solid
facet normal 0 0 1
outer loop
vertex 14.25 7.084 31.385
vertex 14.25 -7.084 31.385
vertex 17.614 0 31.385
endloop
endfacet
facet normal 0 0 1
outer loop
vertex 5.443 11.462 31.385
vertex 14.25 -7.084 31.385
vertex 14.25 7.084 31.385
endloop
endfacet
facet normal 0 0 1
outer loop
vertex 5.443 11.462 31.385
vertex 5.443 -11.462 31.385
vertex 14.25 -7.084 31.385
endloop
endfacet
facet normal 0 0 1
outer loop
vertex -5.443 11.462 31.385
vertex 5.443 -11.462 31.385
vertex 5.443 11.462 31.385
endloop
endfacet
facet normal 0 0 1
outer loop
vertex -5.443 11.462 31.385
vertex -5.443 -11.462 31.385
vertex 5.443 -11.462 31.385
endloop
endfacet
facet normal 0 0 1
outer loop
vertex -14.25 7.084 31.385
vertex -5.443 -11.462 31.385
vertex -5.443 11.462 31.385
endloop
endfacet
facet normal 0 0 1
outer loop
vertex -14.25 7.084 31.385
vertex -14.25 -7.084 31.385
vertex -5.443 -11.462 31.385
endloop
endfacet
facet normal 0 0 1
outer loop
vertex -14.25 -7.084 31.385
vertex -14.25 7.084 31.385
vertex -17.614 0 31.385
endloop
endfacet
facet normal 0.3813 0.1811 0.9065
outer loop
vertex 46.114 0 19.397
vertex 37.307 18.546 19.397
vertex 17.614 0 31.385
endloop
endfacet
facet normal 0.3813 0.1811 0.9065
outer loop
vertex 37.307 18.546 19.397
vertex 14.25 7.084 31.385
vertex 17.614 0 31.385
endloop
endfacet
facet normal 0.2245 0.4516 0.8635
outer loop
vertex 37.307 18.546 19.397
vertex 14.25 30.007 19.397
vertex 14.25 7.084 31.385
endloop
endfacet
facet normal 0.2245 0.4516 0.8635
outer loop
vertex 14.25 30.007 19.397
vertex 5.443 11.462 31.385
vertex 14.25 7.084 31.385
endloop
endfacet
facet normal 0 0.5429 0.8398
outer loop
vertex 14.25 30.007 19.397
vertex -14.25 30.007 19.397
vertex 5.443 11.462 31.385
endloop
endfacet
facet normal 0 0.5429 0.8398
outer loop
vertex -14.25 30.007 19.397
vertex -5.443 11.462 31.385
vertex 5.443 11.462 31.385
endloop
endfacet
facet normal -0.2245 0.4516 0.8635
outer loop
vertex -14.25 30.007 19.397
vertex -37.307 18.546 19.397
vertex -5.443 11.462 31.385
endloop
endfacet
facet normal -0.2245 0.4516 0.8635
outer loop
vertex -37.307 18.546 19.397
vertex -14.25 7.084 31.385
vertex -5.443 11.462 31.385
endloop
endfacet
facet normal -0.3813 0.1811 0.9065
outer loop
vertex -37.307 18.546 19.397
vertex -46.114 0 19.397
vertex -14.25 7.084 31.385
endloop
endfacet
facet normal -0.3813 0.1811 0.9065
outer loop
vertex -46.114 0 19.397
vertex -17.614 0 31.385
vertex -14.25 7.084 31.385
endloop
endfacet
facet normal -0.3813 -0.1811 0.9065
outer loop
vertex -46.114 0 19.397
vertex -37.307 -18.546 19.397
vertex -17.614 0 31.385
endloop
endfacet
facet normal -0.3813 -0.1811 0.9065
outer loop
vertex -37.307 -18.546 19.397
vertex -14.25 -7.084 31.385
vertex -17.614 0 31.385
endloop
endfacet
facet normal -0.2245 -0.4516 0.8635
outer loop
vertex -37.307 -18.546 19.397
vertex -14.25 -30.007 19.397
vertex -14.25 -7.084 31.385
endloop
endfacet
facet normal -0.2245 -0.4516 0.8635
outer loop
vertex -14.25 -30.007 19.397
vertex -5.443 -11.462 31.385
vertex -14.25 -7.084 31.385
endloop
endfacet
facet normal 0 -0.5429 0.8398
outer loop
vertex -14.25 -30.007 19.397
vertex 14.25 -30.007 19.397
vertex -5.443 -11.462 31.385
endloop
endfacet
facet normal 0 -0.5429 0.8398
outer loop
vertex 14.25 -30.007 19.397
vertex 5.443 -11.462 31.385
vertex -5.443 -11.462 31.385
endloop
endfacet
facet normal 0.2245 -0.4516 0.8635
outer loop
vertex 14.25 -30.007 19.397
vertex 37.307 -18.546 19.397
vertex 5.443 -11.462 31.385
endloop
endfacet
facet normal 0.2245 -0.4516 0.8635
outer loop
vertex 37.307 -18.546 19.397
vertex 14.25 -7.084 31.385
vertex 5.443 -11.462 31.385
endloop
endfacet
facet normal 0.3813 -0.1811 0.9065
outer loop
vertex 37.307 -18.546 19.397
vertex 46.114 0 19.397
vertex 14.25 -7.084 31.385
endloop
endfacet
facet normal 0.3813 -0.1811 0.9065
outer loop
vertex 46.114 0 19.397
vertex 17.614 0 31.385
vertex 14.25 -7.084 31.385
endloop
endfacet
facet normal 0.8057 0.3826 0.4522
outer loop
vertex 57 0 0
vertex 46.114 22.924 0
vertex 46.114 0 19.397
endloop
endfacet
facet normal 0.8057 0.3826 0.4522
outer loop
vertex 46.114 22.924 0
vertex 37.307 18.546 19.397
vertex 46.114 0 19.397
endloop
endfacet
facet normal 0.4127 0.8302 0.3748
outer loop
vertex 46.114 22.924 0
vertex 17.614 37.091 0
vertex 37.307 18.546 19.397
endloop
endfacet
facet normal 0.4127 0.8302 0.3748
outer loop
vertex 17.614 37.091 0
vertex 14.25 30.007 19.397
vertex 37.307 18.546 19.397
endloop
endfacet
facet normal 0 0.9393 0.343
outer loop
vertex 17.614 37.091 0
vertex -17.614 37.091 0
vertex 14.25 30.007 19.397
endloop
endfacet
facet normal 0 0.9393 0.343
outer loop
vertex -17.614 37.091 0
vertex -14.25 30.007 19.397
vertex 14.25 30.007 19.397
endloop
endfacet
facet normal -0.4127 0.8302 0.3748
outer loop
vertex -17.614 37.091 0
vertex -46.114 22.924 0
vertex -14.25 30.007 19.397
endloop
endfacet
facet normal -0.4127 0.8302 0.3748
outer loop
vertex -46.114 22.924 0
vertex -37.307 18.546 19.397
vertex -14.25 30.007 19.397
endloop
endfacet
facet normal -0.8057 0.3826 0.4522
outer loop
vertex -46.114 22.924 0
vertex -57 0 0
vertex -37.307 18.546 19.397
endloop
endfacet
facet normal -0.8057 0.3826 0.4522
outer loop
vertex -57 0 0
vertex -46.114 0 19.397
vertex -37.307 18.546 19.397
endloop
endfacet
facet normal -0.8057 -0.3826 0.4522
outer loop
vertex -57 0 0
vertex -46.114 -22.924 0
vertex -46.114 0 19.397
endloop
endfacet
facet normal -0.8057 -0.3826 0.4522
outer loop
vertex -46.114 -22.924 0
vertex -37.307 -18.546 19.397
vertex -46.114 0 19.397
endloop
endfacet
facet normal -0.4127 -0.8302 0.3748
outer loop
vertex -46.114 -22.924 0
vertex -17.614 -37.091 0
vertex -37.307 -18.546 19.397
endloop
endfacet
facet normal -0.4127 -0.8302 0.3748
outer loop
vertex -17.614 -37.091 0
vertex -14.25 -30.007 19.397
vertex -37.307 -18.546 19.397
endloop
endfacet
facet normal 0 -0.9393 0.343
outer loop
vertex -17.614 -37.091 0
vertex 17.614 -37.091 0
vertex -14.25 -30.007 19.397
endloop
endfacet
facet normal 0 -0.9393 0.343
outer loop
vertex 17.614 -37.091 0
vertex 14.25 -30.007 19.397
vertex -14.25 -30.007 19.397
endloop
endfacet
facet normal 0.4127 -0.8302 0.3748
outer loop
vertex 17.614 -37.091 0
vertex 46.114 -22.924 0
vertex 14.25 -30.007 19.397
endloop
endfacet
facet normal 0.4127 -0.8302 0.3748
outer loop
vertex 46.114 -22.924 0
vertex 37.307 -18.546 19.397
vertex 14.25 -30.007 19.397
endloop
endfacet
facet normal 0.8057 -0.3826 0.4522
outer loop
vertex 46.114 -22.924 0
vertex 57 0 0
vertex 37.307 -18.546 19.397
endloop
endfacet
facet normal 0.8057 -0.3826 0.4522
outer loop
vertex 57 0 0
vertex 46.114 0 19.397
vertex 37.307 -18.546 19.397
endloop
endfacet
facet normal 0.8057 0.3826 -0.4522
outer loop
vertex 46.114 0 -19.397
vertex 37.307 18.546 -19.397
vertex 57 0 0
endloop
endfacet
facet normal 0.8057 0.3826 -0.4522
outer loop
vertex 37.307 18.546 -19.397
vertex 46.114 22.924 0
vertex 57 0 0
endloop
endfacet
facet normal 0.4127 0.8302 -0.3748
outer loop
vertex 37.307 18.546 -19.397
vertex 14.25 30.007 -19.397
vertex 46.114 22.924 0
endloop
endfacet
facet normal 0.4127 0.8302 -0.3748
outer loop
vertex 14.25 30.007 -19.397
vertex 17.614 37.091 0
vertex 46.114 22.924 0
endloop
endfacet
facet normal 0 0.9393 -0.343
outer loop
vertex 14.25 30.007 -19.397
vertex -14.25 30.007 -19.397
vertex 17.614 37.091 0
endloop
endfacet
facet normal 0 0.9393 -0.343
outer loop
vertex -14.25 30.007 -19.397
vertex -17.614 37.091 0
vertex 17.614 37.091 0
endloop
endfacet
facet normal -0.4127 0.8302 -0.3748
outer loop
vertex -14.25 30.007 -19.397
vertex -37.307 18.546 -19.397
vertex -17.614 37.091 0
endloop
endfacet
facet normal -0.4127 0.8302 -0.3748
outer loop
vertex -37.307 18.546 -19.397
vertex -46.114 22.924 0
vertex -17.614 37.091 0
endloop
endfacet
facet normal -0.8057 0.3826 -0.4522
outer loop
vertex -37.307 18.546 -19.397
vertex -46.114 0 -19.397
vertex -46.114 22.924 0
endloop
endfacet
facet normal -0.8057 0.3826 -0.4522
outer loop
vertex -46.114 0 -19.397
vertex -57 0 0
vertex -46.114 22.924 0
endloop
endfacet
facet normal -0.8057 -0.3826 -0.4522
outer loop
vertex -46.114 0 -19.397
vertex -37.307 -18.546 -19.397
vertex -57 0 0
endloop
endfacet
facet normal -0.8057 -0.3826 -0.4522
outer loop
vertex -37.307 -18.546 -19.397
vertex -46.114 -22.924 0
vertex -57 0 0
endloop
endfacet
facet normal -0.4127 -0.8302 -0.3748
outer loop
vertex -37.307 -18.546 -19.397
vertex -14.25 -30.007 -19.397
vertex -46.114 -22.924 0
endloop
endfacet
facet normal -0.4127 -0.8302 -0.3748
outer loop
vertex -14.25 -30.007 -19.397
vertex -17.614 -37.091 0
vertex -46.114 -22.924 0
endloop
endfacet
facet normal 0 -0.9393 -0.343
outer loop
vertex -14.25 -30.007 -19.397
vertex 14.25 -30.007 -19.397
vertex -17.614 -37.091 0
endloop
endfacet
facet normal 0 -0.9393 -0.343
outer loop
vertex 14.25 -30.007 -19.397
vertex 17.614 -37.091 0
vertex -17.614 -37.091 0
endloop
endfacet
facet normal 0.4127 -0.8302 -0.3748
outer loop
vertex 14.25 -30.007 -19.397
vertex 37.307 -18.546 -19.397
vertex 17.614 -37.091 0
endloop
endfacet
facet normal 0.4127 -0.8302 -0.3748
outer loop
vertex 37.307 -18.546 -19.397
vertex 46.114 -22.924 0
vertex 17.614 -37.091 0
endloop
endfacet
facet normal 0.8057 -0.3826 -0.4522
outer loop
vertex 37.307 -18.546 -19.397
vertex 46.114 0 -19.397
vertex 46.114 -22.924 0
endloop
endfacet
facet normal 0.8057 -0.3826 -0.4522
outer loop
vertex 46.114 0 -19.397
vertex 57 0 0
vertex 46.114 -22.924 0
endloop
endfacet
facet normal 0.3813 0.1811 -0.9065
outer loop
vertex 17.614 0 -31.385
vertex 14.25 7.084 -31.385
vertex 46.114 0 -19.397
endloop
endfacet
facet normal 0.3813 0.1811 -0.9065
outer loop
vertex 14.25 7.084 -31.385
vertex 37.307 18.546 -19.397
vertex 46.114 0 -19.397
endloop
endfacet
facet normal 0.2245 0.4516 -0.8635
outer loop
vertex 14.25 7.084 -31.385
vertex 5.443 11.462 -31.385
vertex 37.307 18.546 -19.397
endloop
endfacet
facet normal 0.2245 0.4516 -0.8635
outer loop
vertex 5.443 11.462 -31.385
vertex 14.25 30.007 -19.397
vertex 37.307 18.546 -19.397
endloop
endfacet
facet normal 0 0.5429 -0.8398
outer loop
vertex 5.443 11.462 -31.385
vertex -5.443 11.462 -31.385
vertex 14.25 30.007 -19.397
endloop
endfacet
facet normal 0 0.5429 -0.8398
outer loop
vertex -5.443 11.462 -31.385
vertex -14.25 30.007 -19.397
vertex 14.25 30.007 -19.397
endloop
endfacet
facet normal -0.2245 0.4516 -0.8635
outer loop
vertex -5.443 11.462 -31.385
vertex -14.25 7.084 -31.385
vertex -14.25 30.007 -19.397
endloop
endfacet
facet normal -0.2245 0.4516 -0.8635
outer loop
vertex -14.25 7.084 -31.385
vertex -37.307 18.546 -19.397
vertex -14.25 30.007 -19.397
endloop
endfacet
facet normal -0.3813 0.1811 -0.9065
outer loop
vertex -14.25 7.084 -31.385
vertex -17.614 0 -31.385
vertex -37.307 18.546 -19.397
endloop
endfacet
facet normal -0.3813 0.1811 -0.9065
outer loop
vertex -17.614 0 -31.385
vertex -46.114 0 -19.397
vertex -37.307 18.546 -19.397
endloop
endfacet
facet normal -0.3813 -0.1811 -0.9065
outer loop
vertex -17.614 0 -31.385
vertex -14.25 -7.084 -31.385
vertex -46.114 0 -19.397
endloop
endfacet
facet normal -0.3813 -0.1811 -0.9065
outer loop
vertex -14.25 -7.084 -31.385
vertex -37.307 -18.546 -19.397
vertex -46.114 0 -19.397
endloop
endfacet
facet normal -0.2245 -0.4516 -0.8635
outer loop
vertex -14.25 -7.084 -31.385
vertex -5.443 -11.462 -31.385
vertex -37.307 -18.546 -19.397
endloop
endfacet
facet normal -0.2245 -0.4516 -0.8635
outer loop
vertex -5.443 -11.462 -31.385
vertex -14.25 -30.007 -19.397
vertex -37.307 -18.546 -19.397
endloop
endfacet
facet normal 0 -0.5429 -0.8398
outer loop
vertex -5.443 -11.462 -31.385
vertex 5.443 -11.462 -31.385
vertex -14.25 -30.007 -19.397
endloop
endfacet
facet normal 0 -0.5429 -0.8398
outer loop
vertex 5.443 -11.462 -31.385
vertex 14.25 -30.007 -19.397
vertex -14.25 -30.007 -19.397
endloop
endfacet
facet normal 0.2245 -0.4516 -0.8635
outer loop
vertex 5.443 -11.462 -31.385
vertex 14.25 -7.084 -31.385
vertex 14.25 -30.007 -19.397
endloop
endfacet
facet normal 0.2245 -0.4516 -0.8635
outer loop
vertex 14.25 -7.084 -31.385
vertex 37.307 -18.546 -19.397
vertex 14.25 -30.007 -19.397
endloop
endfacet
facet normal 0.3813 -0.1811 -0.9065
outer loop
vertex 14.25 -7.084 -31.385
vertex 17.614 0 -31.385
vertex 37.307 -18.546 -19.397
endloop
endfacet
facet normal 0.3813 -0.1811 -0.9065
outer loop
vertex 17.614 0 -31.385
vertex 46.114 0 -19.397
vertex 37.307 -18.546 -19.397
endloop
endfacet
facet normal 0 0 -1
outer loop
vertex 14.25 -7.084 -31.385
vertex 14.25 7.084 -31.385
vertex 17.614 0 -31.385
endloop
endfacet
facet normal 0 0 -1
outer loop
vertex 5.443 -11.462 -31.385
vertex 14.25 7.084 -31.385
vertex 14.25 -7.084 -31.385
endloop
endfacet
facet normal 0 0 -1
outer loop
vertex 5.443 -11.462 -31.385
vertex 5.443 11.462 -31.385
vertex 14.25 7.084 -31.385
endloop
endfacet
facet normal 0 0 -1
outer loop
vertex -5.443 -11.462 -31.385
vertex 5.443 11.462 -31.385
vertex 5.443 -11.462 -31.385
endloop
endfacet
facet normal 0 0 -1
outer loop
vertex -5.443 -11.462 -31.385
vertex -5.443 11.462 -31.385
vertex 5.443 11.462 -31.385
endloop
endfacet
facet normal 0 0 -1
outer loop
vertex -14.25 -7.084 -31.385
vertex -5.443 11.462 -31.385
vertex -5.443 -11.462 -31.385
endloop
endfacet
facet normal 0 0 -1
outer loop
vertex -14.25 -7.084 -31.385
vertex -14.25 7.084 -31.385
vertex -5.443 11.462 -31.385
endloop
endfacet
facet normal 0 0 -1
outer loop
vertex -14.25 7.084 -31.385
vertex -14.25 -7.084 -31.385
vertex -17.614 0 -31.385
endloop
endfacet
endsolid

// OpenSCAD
// Generated by SolidPython 1.0.1 on 2020-07-29 00:46:54


scale(v = [19, 13, 11]) {
	sphere(r = 3);
}
/***********************************************
*********      SolidPython code:      **********
************************************************
 
# import packages: SolidPython
from solid import *
from solid.utils import *
from itertools import chain, combinations, permutations


class Resize:

    def __init__(self, scad_file):
        self.scad_file = scad_file
        #self.scad_file = import_scad(scad_file)
        # cone/cylinder param:
        self.r1 = 0
        self.r2 = 0
        self.h = 0
        # rectangular prism param:
        self.w = 0
        self.l = 0
        # ellipse param:
        self.r = 0

    # import OpenScad code (file name corresponds to shape)


    # classify shape + parameters
    def assign(self, param1, param2, param3):
        if self.scad_file == 'cone.scad':
            self.r1 = param1
            self.r2 = param2
            self.h = param3
        elif self.scad_file == 'cylinder.scad':
            self.r1 = param1
            self.r2 = param2
            self.h = param3
        elif self.scad_file == 'rectangularPrism.scad':
            self.h = param1
            self.l = param2
            self.w = param3
        else:
            self.r = param1
            self.h = param2

    # resize parameters
    def iterate(self):
        x = range(3, 20, 2)
        i = 1
        if self.scad_file == 'cone.scad':
            tempList = list(permutations(x, 2))
            for temp in tempList:
                param1 = temp[0]
                param2 = temp[1]
                filepath = 'produced_scad_files/' + 'cone' + str(param1) + '_' + str(param2) + '_' + '.scad'
                scad_render_to_file(cylinder(h=param1, r1=param2, r2=0), filepath)

        elif self.scad_file == 'cylinder.scad':
            tempList = list(permutations(x, 3))
            for temp in tempList:
                param1 = temp[0]
                param2 = temp[1]
                filepath = 'produced_scad_files/' + 'cylinder' + str(param1) + '_' + str(param2) + '_' + '.scad'
                scad_render_to_file(cylinder(h=param1, r1=param2, r2=param2), filepath)

        elif self.scad_file == 'rectangularPrism.scad':
            tempList = list(permutations(x, 3))
            for temp in tempList:
                param1 = temp[0]
                param2 = temp[1]
                param3 = temp[2]
                filepath = 'produced_scad_files/' + 'rectangularPrism' + str(param1) + '_' + str(param2) + '_' + str(
                    param3) + '.scad'
                scad_render_to_file(cube(size=(param1, param2, param3)), filepath)

        elif self.scad_file == 'ellipse.scad':
            tempList = list(permutations(x, 4))
            for temp in tempList:
                param1 = temp[0]
                param2 = temp[1]
                param3 = temp[2]
                param4 = temp[3]
                filepath = 'produced_scad_files/' + 'ellipse' + str(param1) + '_' + str(param2) + '_' + str(param3) + '_' + str(param4) + '.scad'
                scad_render_to_file(scale([param1, param2, param3])(sphere(r=param4)), filepath)

    def render_to_scadfile(self):
        scad_render_to_file(scad, 'example.scad') 
 
************************************************/
